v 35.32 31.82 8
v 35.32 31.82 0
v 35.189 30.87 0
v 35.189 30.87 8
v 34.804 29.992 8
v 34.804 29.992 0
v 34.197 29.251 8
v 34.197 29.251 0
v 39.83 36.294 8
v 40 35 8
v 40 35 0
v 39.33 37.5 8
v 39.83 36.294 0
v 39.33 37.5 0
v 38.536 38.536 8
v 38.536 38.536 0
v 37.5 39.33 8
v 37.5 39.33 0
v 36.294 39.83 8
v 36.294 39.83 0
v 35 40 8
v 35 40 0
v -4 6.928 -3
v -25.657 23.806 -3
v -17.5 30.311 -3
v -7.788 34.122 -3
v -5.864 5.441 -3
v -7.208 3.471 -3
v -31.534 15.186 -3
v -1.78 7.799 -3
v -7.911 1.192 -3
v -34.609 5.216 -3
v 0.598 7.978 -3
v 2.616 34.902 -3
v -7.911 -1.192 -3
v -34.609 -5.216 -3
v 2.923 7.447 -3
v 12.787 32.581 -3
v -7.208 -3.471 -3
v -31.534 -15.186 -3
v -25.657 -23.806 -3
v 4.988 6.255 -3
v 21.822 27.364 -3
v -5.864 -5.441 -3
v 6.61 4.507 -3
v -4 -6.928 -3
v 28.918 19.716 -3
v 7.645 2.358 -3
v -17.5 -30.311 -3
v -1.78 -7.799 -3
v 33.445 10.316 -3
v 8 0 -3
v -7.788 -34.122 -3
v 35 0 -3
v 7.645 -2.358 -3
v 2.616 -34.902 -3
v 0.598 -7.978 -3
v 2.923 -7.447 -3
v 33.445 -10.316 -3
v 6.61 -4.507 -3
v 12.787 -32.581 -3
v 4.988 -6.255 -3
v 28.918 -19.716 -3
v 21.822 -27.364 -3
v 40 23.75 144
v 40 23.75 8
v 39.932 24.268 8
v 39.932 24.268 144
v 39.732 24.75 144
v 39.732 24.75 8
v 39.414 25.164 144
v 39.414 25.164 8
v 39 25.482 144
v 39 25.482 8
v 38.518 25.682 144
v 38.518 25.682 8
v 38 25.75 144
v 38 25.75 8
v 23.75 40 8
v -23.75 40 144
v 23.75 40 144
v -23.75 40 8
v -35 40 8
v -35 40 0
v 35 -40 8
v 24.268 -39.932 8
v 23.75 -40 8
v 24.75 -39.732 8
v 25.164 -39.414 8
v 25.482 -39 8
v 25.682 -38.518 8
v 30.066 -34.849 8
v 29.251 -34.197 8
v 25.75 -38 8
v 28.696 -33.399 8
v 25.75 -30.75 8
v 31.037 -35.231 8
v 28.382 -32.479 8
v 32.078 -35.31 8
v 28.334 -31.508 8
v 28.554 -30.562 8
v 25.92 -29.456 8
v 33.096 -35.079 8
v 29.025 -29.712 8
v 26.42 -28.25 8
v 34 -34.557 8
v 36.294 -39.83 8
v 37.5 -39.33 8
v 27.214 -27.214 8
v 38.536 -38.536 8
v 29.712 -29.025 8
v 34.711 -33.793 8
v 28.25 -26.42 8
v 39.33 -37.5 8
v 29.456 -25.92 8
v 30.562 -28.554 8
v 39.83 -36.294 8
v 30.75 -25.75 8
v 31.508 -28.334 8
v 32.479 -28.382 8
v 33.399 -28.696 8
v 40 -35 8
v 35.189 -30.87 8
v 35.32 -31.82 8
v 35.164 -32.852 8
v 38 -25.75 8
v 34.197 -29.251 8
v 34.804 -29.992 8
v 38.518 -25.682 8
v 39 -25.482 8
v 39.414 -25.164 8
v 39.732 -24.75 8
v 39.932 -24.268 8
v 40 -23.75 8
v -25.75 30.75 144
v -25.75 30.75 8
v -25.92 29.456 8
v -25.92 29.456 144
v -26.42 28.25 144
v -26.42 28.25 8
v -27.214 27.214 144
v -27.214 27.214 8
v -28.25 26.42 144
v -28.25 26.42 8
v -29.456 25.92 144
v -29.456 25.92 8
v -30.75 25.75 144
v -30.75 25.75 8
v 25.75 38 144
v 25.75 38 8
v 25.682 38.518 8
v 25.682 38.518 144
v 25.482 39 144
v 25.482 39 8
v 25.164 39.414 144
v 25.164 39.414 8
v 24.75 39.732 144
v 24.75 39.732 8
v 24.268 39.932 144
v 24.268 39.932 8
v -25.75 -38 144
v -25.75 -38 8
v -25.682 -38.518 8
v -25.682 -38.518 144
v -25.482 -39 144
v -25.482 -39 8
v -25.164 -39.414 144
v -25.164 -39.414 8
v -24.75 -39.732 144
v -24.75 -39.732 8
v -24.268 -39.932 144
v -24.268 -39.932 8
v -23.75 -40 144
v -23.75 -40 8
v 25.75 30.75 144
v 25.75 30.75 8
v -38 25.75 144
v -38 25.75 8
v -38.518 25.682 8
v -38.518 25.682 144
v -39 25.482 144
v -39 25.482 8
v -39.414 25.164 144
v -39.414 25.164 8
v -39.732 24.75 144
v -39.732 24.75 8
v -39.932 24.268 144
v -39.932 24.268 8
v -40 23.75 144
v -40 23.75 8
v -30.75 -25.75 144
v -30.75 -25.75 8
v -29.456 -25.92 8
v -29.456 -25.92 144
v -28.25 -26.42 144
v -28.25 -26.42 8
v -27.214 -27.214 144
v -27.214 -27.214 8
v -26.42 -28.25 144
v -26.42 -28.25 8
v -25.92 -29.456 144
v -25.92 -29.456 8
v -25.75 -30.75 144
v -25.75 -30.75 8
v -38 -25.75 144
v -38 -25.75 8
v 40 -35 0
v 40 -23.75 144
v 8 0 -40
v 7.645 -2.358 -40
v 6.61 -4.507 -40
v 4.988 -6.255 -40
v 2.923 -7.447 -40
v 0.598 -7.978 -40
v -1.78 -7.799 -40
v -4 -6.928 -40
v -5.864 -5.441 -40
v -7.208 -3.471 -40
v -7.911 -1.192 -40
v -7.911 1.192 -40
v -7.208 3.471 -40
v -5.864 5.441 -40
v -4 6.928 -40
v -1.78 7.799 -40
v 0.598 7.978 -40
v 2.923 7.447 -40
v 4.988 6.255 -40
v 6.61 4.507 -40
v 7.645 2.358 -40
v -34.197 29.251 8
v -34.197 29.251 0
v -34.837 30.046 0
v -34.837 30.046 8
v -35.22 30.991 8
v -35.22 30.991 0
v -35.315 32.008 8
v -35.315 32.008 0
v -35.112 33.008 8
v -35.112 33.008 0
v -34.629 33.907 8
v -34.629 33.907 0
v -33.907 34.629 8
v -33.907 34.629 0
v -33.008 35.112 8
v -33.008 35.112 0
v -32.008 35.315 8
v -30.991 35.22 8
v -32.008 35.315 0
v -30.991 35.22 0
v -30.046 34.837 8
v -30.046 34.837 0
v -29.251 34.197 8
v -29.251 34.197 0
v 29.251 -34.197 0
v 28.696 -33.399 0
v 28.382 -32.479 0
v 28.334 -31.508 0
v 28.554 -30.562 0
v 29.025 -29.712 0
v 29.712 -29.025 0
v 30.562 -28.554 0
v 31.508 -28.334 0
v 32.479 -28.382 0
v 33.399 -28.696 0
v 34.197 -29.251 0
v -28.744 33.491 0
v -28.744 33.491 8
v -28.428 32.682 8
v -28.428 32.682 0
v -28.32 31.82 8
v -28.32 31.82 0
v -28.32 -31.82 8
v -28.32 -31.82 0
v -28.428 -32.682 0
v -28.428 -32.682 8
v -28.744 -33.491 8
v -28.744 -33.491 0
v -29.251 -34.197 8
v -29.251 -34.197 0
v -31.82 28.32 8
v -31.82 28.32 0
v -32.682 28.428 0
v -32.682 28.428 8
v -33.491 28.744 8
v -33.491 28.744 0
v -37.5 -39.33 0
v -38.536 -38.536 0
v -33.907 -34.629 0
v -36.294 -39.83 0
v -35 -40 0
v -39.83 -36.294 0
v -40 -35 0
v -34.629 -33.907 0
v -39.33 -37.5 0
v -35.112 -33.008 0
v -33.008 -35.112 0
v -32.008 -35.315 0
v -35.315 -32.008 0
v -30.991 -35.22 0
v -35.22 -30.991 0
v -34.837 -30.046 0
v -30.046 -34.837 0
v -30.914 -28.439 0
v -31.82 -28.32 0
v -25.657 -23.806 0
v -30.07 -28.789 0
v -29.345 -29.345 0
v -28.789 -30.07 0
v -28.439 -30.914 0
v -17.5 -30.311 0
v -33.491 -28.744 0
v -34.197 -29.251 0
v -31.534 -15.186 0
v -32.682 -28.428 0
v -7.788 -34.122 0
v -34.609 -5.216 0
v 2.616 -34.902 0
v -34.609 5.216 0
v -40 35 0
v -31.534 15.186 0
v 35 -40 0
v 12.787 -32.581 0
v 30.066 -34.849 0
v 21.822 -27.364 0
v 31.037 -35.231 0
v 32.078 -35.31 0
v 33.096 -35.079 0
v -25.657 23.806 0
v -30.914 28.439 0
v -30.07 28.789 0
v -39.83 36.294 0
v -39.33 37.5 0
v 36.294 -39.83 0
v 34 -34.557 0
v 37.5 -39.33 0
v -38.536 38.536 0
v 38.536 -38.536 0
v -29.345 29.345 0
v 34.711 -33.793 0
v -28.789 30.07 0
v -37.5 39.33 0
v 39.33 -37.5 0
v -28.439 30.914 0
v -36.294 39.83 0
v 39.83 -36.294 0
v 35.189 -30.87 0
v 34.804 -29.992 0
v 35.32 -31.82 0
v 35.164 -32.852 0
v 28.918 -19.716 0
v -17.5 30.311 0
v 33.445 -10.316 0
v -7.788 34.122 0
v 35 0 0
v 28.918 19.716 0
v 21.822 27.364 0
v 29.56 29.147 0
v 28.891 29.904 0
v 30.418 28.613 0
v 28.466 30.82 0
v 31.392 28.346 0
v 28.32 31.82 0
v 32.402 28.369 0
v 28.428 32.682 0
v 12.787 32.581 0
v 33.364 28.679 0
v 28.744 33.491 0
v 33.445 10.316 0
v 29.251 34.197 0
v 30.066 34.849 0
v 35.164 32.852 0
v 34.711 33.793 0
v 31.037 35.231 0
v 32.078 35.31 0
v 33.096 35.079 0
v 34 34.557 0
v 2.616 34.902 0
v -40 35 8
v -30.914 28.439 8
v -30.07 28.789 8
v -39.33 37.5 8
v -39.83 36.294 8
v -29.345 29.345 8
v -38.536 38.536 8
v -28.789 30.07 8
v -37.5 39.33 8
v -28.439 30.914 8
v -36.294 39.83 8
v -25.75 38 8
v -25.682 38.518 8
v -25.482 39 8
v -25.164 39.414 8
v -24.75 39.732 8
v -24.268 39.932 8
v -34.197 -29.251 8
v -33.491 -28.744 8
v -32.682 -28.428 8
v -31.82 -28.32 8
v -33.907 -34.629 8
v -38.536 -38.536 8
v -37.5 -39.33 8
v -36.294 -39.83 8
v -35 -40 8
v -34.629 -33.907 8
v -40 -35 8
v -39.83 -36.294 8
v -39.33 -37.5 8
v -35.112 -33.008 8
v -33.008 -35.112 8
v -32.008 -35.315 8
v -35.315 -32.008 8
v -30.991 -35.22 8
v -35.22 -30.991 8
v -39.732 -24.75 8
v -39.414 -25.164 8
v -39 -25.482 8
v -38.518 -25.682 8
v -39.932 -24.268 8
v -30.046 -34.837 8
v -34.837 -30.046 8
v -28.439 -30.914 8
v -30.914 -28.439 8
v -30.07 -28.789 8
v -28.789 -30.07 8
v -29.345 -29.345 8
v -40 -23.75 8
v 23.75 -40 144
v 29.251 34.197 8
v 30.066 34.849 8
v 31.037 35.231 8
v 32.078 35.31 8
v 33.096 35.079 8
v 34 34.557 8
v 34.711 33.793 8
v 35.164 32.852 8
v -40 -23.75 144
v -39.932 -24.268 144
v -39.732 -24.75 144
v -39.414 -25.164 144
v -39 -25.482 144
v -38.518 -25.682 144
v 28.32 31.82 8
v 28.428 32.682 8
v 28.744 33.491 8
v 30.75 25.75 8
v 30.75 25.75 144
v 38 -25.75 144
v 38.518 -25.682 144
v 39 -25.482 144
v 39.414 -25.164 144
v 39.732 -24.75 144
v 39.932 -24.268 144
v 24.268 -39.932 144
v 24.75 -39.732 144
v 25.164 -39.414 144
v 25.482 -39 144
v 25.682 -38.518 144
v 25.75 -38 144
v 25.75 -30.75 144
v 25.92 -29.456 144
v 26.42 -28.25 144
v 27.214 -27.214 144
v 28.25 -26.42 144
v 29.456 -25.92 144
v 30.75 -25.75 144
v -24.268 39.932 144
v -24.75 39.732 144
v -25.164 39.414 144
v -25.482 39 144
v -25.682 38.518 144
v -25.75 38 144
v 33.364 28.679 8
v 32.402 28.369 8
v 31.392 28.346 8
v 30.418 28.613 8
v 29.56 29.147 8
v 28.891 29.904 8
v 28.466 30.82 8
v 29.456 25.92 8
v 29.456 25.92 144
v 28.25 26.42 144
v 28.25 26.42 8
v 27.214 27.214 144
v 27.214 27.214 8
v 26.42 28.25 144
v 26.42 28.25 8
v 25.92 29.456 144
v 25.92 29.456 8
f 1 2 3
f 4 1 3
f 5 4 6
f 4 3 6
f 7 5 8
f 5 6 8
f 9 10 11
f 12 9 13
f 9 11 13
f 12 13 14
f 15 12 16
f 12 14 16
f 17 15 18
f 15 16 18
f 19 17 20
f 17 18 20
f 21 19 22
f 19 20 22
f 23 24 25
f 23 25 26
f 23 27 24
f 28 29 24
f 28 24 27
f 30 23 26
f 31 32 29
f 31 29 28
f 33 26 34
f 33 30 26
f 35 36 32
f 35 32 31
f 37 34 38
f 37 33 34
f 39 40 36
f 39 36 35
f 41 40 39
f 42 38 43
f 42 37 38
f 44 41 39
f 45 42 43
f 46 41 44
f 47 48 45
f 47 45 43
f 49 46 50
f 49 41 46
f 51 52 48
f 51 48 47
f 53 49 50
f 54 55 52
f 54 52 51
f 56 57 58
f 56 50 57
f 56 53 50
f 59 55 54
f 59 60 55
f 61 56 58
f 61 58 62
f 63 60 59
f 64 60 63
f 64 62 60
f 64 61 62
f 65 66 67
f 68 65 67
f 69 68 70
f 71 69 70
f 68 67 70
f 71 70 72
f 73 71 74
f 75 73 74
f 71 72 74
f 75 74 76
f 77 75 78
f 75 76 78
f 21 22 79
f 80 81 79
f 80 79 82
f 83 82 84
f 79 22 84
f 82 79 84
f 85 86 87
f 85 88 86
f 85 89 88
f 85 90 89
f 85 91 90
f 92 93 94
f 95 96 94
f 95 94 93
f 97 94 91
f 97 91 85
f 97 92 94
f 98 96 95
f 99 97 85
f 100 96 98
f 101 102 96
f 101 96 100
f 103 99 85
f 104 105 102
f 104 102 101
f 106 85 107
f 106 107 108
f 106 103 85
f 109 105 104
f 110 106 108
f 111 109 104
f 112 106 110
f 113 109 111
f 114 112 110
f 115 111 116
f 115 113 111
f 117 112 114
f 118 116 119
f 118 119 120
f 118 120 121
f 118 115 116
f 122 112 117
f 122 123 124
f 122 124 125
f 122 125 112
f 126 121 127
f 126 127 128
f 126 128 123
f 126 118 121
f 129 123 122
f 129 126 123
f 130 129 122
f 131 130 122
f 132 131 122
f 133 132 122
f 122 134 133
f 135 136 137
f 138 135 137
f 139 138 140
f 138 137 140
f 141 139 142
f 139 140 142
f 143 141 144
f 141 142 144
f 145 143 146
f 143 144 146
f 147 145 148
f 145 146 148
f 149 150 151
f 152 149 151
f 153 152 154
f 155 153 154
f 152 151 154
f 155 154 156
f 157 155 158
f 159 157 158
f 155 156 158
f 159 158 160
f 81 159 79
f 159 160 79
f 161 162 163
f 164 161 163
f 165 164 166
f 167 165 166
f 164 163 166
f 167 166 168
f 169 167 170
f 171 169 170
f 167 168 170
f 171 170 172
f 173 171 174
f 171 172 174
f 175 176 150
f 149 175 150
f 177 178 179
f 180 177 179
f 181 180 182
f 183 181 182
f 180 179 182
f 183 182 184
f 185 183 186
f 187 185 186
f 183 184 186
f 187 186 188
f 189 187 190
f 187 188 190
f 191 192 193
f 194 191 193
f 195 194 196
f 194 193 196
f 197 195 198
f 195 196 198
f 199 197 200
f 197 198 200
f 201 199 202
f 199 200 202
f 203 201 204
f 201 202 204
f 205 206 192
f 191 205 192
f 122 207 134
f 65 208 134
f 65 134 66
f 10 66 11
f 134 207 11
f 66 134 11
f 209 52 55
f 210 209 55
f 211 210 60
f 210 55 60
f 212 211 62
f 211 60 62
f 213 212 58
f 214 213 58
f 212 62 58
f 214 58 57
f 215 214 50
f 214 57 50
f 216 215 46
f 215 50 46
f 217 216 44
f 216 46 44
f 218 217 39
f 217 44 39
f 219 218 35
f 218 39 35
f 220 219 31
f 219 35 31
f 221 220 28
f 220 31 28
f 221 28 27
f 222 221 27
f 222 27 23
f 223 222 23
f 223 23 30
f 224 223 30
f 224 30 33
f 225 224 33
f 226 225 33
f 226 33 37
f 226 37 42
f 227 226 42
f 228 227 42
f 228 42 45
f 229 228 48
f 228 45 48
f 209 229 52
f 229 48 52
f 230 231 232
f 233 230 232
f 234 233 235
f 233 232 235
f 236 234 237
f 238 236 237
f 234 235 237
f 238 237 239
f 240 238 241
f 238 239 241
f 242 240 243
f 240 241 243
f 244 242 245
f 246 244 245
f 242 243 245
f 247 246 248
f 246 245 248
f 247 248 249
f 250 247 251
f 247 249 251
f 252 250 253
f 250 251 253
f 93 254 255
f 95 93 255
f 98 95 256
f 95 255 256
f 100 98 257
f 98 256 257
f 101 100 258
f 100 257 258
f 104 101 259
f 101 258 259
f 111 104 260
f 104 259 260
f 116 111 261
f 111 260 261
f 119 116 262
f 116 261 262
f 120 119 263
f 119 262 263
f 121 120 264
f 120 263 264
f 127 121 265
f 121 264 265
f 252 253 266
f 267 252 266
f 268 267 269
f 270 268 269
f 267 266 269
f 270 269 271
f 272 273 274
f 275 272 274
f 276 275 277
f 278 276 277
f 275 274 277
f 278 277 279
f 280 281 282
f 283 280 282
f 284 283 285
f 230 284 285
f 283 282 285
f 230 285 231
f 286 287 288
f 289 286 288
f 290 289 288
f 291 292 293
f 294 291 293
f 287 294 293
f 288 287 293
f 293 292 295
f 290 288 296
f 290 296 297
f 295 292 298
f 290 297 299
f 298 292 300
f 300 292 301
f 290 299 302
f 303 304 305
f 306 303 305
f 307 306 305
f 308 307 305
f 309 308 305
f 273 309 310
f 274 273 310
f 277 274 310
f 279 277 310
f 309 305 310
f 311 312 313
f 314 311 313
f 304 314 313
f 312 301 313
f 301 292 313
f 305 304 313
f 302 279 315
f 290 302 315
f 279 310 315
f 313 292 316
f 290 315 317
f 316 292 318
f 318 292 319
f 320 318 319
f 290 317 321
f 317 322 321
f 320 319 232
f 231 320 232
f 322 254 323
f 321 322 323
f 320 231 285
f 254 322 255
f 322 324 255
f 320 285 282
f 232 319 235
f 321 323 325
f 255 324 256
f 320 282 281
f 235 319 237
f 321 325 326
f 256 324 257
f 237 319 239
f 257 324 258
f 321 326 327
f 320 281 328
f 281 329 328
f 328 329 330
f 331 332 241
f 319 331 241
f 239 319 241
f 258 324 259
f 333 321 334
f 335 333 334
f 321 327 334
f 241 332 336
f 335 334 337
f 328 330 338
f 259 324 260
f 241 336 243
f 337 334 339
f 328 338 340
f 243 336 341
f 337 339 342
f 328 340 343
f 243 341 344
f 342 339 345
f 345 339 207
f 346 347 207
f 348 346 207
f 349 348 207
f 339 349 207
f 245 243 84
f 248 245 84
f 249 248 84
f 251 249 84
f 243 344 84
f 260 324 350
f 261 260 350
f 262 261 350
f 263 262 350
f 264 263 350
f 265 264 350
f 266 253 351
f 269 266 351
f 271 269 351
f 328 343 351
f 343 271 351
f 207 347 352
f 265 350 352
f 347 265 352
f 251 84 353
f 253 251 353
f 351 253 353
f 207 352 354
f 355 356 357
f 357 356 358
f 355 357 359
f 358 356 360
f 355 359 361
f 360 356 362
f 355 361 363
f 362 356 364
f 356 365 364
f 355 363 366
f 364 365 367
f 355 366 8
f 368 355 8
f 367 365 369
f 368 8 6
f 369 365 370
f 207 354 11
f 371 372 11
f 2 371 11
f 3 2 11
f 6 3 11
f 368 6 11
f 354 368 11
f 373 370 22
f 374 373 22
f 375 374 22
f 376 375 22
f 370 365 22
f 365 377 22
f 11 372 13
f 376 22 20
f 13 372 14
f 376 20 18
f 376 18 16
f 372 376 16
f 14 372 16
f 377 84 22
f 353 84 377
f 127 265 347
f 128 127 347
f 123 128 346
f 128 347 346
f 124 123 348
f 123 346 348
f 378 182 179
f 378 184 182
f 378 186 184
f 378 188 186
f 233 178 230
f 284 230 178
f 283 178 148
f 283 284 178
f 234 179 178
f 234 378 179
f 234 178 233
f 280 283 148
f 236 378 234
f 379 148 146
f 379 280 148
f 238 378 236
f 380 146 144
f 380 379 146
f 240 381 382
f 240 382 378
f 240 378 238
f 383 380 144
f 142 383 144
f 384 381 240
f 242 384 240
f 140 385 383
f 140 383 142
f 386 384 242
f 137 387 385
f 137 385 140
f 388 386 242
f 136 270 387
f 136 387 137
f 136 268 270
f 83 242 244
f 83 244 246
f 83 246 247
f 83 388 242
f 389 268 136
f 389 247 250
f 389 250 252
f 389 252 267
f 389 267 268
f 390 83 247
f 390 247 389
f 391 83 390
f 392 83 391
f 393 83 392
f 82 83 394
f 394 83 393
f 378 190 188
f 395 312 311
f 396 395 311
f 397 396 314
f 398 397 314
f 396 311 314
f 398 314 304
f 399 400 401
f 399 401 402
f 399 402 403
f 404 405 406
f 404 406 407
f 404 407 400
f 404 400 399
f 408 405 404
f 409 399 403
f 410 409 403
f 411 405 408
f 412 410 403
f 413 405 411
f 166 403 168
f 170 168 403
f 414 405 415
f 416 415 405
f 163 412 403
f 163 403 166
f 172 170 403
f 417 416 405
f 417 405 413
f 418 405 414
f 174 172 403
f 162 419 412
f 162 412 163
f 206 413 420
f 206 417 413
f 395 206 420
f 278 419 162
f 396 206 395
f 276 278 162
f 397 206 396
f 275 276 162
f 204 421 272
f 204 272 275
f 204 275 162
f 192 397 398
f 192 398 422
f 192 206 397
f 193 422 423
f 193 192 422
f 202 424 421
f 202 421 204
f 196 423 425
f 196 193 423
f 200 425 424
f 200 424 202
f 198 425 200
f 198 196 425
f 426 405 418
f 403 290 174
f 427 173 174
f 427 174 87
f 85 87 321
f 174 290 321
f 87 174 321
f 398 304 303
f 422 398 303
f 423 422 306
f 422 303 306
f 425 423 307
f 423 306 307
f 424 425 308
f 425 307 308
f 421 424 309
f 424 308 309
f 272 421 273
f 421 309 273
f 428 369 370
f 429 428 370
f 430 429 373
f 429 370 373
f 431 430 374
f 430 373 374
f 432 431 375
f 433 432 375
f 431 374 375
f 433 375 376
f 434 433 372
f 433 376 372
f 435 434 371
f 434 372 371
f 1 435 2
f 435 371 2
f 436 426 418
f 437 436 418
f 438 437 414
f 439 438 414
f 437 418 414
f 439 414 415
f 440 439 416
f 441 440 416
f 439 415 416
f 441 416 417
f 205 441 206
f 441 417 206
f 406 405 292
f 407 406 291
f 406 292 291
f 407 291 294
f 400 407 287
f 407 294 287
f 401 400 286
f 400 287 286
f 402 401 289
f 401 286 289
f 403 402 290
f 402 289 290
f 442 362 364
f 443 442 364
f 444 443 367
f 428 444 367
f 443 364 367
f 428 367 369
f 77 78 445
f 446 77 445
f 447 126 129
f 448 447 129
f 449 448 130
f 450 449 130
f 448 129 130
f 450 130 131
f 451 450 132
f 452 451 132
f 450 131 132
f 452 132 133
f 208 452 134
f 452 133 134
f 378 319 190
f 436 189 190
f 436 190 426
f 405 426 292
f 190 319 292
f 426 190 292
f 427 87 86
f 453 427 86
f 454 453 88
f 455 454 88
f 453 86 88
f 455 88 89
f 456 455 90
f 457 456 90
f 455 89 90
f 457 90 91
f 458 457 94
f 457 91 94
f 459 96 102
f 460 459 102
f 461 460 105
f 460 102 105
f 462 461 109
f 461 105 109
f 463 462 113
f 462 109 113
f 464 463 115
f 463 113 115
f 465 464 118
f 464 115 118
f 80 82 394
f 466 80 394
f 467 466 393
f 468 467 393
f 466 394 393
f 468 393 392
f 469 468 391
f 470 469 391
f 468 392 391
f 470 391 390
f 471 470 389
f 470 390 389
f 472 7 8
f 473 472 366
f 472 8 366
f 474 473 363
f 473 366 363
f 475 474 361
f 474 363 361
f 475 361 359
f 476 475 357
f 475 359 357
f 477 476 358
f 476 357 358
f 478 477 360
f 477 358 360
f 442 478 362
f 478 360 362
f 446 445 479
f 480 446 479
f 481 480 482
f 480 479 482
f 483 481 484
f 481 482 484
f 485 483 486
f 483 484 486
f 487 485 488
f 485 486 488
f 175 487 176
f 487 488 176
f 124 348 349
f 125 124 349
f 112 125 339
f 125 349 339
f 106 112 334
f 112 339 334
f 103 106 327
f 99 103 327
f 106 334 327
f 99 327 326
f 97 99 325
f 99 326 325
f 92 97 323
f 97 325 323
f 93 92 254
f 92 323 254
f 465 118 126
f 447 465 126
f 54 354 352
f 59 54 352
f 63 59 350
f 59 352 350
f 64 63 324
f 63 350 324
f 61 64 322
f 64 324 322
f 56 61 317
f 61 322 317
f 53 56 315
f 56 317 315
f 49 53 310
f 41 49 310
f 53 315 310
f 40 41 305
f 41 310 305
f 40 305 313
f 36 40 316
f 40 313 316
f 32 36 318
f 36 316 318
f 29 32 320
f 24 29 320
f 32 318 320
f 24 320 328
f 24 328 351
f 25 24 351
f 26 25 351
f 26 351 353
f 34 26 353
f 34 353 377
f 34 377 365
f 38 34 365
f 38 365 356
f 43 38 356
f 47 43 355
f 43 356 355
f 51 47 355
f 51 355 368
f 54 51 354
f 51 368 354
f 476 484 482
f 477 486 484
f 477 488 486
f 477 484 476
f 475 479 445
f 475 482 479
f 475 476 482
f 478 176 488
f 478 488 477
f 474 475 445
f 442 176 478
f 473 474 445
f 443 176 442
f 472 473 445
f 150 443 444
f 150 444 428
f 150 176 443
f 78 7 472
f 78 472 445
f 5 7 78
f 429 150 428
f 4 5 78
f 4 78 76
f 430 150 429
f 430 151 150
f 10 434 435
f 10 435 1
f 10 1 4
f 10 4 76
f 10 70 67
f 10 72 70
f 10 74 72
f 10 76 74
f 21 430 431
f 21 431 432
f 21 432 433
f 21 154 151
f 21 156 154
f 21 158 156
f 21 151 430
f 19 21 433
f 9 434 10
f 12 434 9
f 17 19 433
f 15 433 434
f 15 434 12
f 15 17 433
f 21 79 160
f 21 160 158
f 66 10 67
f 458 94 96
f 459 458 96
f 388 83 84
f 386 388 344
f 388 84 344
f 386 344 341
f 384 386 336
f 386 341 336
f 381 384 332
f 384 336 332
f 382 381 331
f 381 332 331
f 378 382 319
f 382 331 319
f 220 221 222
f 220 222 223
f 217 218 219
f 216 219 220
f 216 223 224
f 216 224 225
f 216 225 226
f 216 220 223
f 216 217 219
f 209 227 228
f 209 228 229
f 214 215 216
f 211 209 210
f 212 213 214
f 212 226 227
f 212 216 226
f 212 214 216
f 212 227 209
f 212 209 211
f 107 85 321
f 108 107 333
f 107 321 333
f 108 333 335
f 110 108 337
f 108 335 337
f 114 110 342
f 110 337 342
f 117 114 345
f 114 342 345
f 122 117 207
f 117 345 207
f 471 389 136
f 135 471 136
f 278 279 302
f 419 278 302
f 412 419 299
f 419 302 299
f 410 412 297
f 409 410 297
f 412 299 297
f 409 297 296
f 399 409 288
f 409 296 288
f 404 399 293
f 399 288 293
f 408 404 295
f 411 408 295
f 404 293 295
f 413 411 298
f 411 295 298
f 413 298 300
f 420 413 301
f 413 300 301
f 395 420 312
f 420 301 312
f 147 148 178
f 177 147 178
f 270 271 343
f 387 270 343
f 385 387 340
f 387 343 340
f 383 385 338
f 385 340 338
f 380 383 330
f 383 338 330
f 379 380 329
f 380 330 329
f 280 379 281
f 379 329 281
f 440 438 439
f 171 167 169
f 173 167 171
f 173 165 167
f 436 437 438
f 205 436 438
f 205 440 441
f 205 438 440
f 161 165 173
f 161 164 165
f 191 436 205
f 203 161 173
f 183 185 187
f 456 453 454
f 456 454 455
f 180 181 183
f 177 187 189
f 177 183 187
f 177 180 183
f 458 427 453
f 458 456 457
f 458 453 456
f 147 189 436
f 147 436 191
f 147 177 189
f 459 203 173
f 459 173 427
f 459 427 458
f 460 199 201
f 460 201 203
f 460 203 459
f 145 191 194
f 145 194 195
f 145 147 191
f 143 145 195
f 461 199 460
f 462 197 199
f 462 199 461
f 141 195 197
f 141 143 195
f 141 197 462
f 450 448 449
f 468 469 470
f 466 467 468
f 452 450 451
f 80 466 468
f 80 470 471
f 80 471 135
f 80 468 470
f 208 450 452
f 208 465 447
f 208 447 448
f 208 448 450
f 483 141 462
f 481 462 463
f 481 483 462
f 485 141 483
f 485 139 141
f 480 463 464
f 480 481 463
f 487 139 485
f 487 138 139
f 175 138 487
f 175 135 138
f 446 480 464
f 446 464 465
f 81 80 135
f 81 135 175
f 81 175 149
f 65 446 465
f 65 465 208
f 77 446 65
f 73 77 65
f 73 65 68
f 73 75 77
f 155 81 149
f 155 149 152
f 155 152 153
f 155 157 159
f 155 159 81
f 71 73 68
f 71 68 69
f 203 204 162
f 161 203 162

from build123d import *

# Parameters (mm, degrees)
F1_DEPTH = 8
F2_R     = 35
F3_DEPTH = 3
F4_R     = 8
F5_DEPTH = 37
F7_DEPTH = 136


# Not quite as in the source:
# - a feature names something its author has since deleted; it is built from what else it names


with BuildPart() as f1:
    # F0 (on Top) → F1 (new body)
    with BuildSketch(Plane.XY):
        with BuildLine():
            Line((-20.6155281281, 40), (-35, 40))
            ThreePointArc((-35, 40), (-38.5355339059, 38.5355339059), (-40, 35))
            Line((-40, 35), (-40, 20.6155281281))
            ThreePointArc((-40, 20.6155281281), (-37.348673038, 25.1013271024), (-34.1965616575, 29.25055847))
            ThreePointArc((-34.1965616575, 29.25055847), (-34.2946788875, 34.2946788875), (-29.25055847, 34.1965616575))
            ThreePointArc((-29.25055847, 34.1965616575), (-25.1013271024, 37.348673038), (-20.6155281281, 40))
        make_face()
        with BuildLine():
            ThreePointArc((-34.1965616575, 29.25055847), (-37.348673038, 25.1013271024), (-40, 20.6155281281))
            Line((-40, 20.6155281281), (-40, -20.6155281281))
            ThreePointArc((-40, -20.6155281281), (-37.348673038, -25.1013271024), (-34.1965616575, -29.25055847))
            ThreePointArc((-34.1965616575, -29.25055847), (-33.0960568151, -28.5607897045), (-31.8198051534, -28.3198051534))
            Line((-31.8198051534, -28.3198051534), (-31.8198051534, 28.3198051534))
            ThreePointArc((-31.8198051534, 28.3198051534), (-33.0960568151, 28.5607897045), (-34.1965616575, 29.25055847))
        make_face()
        with BuildLine():
            Line((28.3198051534, 31.8198051534), (-28.3198051534, 31.8198051534))
            ThreePointArc((-28.3198051534, 31.8198051534), (-29.3449314192, 29.3449314192), (-31.8198051534, 28.3198051534))
            Line((-31.8198051534, 28.3198051534), (-31.8198051534, -28.3198051534))
            ThreePointArc((-31.8198051534, -28.3198051534), (-29.3449314192, -29.3449314192), (-28.3198051534, -31.8198051534))
            ThreePointArc((-28.3198051534, -31.8198051534), (-28.5607897045, -33.0960568151), (-29.25055847, -34.1965616575))
            ThreePointArc((-29.25055847, -34.1965616575), (-25.1013271024, -37.348673038), (-20.6155281281, -40))
            Line((-20.6155281281, -40), (20.6155281281, -40))
            ThreePointArc((20.6155281281, -40), (25.1013271024, -37.348673038), (29.25055847, -34.1965616575))
            ThreePointArc((29.25055847, -34.1965616575), (29.3449314192, -29.3449314192), (34.1965616575, -29.25055847))
            ThreePointArc((34.1965616575, -29.25055847), (37.348673038, -25.1013271024), (40, -20.6155281281))
            Line((40, -20.6155281281), (40, 20.6155281281))
            ThreePointArc((40, 20.6155281281), (37.348673038, 25.1013271024), (34.1965616575, 29.25055847))
            ThreePointArc((34.1965616575, 29.25055847), (30.417779434, 28.612887025), (28.3198051534, 31.8198051534))
        make_face()
        with BuildLine():
            Line((20.6155281281, 40), (-20.6155281281, 40))
            ThreePointArc((-20.6155281281, 40), (-25.1013271024, 37.348673038), (-29.25055847, 34.1965616575))
            ThreePointArc((-29.25055847, 34.1965616575), (-28.5607897045, 33.0960568151), (-28.3198051534, 31.8198051534))
            Line((-28.3198051534, 31.8198051534), (28.3198051534, 31.8198051534))
            ThreePointArc((28.3198051534, 31.8198051534), (28.5607897045, 33.0960568151), (29.25055847, 34.1965616575))
            ThreePointArc((29.25055847, 34.1965616575), (25.1013271024, 37.348673038), (20.6155281281, 40))
        make_face()
        with BuildLine():
            Line((35, 40), (20.6155281281, 40))
            ThreePointArc((20.6155281281, 40), (25.1013271024, 37.348673038), (29.25055847, 34.1965616575))
            ThreePointArc((29.25055847, 34.1965616575), (33.0960568151, 35.0788206023), (35.3198051534, 31.8198051534))
            ThreePointArc((35.3198051534, 31.8198051534), (35.0267232818, 30.417779434), (34.1965616575, 29.25055847))
            ThreePointArc((34.1965616575, 29.25055847), (37.348673038, 25.1013271024), (40, 20.6155281281))
            Line((40, 20.6155281281), (40, 35))
            ThreePointArc((40, 35), (38.5355339059, 38.5355339059), (35, 40))
        make_face()
        with BuildLine():
            ThreePointArc((-34.1965616575, -29.25055847), (-37.348673038, -25.1013271024), (-40, -20.6155281281))
            Line((-40, -20.6155281281), (-40, -35))
            ThreePointArc((-40, -35), (-38.5355339059, -38.5355339059), (-35, -40))
            Line((-35, -40), (-20.6155281281, -40))
            ThreePointArc((-20.6155281281, -40), (-25.1013271024, -37.348673038), (-29.25055847, -34.1965616575))
            ThreePointArc((-29.25055847, -34.1965616575), (-34.2946788875, -34.2946788875), (-34.1965616575, -29.25055847))
        make_face()
        with BuildLine():
            Line((40, -35), (40, -20.6155281281))
            ThreePointArc((40, -20.6155281281), (37.348673038, -25.1013271024), (34.1965616575, -29.25055847))
            ThreePointArc((34.1965616575, -29.25055847), (35.0267232818, -30.417779434), (35.3198051534, -31.8198051534))
            ThreePointArc((35.3198051534, -31.8198051534), (33.0960568151, -35.0788206023), (29.25055847, -34.1965616575))
            ThreePointArc((29.25055847, -34.1965616575), (25.1013271024, -37.348673038), (20.6155281281, -40))
            Line((20.6155281281, -40), (35, -40))
            ThreePointArc((35, -40), (38.5355339059, -38.5355339059), (40, -35))
        make_face()
    extrude(amount=F1_DEPTH)

    # F2 (on face) → F3 (join)
    with BuildSketch(Plane(origin=(0, 0, 0), x_dir=(1, 0, 0), z_dir=(0, 0, -1))):
        Circle(F2_R)
    extrude(amount=F3_DEPTH)

    # F4 (on face) → F5 (join)
    with BuildSketch(Plane(origin=(0, 0, -3), x_dir=(1, 0, 0), z_dir=(0, 0, -1))):
        Circle(F4_R)
    extrude(amount=F5_DEPTH)

    # F6 (on face) → F7 (join)
    with BuildSketch(Plane.XY.offset(8)):
        with BuildLine():
            Line((-30.75, 25.75), (-38, 25.75))
            ThreePointArc((-38, 25.75), (-39.4142135624, 25.1642135624), (-40, 23.75))
            Line((-40, 23.75), (-40, -23.75))
            ThreePointArc((-40, -23.75), (-39.4142135624, -25.1642135624), (-38, -25.75))
            Line((-38, -25.75), (-30.75, -25.75))
            ThreePointArc((-30.75, -25.75), (-27.2144660941, -27.2144660941), (-25.75, -30.75))
            Line((-25.75, -30.75), (-25.75, -38))
            ThreePointArc((-25.75, -38), (-25.1642135624, -39.4142135624), (-23.75, -40))
            Line((-23.75, -40), (23.75, -40))
            ThreePointArc((23.75, -40), (25.1642135624, -39.4142135624), (25.75, -38))
            Line((25.75, -38), (25.75, -30.75))
            ThreePointArc((25.75, -30.75), (27.2144660941, -27.2144660941), (30.75, -25.75))
            Line((30.75, -25.75), (38, -25.75))
            ThreePointArc((38, -25.75), (39.4142135624, -25.1642135624), (40, -23.75))
            Line((40, -23.75), (40, 23.75))
            ThreePointArc((40, 23.75), (39.4142135624, 25.1642135624), (38, 25.75))
            Line((38, 25.75), (30.75, 25.75))
            ThreePointArc((30.75, 25.75), (27.2144660941, 27.2144660941), (25.75, 30.75))
            Line((25.75, 30.75), (25.75, 38))
            ThreePointArc((25.75, 38), (25.1642135624, 39.4142135624), (23.75, 40))
            Line((23.75, 40), (-23.75, 40))
            ThreePointArc((-23.75, 40), (-25.1642135624, 39.4142135624), (-25.75, 38))
            Line((-25.75, 38), (-25.75, 30.75))
            ThreePointArc((-25.75, 30.75), (-27.2144660941, 27.2144660941), (-30.75, 25.75))
        make_face()
    extrude(amount=F7_DEPTH)


solid = f1.part
